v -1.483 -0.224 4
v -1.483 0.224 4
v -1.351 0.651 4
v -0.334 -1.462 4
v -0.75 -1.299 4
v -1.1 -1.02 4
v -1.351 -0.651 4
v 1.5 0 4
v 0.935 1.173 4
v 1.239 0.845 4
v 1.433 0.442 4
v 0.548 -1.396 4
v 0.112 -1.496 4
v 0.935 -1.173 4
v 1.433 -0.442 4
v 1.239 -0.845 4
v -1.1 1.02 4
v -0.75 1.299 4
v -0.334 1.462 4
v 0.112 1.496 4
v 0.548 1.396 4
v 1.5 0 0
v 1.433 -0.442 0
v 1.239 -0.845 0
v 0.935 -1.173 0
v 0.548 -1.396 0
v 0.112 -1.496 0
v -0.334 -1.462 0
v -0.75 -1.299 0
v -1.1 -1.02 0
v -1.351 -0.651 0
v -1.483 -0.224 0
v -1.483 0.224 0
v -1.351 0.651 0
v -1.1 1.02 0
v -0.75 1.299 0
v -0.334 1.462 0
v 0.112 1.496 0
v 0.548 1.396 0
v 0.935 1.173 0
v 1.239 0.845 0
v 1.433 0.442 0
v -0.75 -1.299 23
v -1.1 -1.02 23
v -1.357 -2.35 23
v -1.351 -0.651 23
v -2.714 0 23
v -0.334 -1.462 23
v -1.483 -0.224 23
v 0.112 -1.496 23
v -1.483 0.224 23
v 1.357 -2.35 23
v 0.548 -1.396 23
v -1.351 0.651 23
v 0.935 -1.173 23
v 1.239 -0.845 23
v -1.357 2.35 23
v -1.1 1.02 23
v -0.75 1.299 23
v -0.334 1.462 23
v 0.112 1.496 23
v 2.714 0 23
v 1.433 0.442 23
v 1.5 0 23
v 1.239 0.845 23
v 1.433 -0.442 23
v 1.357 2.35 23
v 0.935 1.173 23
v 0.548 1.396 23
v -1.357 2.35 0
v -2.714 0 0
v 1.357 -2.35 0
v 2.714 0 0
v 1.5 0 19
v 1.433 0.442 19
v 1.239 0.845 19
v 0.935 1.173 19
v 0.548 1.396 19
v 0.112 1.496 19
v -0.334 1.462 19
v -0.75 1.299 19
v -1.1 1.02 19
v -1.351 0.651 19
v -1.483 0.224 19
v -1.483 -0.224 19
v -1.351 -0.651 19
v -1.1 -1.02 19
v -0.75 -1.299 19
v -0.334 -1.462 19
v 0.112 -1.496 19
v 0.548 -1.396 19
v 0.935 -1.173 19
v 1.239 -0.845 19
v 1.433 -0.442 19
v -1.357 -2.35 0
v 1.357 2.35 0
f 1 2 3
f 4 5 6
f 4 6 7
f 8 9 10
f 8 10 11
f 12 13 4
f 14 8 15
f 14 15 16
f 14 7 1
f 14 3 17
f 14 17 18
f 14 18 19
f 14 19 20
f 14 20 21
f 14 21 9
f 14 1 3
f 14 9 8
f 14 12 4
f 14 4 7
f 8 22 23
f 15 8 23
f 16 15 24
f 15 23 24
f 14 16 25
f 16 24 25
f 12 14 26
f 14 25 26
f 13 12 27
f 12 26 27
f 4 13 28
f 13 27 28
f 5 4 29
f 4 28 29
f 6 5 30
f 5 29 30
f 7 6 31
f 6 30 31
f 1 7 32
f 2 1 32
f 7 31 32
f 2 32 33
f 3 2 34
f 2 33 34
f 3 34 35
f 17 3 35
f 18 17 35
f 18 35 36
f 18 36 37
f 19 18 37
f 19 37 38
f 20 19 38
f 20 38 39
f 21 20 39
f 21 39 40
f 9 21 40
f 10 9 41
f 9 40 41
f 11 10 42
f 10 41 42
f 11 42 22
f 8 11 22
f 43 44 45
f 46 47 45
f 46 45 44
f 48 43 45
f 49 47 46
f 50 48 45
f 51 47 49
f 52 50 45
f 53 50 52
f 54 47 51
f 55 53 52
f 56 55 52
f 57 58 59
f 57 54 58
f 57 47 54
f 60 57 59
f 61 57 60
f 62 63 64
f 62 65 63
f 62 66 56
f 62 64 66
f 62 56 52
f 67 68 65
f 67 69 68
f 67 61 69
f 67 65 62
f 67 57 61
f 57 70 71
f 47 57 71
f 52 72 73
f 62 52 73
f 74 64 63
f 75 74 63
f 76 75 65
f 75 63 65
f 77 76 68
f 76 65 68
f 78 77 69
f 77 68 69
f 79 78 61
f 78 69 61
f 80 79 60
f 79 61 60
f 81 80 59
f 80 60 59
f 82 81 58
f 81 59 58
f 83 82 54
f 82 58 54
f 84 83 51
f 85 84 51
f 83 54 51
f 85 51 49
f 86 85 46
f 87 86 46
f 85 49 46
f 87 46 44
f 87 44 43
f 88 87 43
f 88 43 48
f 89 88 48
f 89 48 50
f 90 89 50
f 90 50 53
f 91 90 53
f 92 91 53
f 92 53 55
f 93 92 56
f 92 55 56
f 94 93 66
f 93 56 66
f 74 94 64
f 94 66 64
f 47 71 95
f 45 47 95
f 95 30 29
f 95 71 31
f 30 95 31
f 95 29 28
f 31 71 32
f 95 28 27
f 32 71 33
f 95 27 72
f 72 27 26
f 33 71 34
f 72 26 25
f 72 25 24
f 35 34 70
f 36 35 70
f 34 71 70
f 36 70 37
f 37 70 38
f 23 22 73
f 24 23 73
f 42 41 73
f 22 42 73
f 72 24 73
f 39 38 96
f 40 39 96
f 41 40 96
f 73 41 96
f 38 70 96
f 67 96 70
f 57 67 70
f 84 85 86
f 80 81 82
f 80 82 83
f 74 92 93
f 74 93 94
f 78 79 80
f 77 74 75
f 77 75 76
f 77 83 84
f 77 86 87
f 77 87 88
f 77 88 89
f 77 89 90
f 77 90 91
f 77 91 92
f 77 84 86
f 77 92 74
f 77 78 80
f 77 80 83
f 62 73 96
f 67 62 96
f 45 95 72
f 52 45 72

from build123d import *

# Parameters (mm, degrees)
F1_DEPTH = 23
F2_R     = 1.5
F3_DEPTH = 4
F4_R     = 1.5
F5_DEPTH = 4


with BuildPart() as f1:
    # F0 (on Top) → F1 (new body)
    with BuildSketch(Plane.XY):
        Polygon((-1.356773, -2.35), (1.356773, -2.35), (2.713546, 0), (1.356773, 2.35), (-1.356773, 2.35), (-2.713546, 0), align=None)
    extrude(amount=F1_DEPTH)

    # F2 (on face) → F3 (cut)
    with BuildSketch(Plane.XY.offset(23)):
        Circle(F2_R)
    extrude(amount=-F3_DEPTH, mode=Mode.SUBTRACT)

    # F4 (on face) → F5 (cut)
    with BuildSketch(Plane(origin=(0, 0, 0), x_dir=(1, 0, 0), z_dir=(0, 0, -1))):
        Circle(F4_R)
    extrude(amount=-F5_DEPTH, mode=Mode.SUBTRACT)


solid = f1.part
